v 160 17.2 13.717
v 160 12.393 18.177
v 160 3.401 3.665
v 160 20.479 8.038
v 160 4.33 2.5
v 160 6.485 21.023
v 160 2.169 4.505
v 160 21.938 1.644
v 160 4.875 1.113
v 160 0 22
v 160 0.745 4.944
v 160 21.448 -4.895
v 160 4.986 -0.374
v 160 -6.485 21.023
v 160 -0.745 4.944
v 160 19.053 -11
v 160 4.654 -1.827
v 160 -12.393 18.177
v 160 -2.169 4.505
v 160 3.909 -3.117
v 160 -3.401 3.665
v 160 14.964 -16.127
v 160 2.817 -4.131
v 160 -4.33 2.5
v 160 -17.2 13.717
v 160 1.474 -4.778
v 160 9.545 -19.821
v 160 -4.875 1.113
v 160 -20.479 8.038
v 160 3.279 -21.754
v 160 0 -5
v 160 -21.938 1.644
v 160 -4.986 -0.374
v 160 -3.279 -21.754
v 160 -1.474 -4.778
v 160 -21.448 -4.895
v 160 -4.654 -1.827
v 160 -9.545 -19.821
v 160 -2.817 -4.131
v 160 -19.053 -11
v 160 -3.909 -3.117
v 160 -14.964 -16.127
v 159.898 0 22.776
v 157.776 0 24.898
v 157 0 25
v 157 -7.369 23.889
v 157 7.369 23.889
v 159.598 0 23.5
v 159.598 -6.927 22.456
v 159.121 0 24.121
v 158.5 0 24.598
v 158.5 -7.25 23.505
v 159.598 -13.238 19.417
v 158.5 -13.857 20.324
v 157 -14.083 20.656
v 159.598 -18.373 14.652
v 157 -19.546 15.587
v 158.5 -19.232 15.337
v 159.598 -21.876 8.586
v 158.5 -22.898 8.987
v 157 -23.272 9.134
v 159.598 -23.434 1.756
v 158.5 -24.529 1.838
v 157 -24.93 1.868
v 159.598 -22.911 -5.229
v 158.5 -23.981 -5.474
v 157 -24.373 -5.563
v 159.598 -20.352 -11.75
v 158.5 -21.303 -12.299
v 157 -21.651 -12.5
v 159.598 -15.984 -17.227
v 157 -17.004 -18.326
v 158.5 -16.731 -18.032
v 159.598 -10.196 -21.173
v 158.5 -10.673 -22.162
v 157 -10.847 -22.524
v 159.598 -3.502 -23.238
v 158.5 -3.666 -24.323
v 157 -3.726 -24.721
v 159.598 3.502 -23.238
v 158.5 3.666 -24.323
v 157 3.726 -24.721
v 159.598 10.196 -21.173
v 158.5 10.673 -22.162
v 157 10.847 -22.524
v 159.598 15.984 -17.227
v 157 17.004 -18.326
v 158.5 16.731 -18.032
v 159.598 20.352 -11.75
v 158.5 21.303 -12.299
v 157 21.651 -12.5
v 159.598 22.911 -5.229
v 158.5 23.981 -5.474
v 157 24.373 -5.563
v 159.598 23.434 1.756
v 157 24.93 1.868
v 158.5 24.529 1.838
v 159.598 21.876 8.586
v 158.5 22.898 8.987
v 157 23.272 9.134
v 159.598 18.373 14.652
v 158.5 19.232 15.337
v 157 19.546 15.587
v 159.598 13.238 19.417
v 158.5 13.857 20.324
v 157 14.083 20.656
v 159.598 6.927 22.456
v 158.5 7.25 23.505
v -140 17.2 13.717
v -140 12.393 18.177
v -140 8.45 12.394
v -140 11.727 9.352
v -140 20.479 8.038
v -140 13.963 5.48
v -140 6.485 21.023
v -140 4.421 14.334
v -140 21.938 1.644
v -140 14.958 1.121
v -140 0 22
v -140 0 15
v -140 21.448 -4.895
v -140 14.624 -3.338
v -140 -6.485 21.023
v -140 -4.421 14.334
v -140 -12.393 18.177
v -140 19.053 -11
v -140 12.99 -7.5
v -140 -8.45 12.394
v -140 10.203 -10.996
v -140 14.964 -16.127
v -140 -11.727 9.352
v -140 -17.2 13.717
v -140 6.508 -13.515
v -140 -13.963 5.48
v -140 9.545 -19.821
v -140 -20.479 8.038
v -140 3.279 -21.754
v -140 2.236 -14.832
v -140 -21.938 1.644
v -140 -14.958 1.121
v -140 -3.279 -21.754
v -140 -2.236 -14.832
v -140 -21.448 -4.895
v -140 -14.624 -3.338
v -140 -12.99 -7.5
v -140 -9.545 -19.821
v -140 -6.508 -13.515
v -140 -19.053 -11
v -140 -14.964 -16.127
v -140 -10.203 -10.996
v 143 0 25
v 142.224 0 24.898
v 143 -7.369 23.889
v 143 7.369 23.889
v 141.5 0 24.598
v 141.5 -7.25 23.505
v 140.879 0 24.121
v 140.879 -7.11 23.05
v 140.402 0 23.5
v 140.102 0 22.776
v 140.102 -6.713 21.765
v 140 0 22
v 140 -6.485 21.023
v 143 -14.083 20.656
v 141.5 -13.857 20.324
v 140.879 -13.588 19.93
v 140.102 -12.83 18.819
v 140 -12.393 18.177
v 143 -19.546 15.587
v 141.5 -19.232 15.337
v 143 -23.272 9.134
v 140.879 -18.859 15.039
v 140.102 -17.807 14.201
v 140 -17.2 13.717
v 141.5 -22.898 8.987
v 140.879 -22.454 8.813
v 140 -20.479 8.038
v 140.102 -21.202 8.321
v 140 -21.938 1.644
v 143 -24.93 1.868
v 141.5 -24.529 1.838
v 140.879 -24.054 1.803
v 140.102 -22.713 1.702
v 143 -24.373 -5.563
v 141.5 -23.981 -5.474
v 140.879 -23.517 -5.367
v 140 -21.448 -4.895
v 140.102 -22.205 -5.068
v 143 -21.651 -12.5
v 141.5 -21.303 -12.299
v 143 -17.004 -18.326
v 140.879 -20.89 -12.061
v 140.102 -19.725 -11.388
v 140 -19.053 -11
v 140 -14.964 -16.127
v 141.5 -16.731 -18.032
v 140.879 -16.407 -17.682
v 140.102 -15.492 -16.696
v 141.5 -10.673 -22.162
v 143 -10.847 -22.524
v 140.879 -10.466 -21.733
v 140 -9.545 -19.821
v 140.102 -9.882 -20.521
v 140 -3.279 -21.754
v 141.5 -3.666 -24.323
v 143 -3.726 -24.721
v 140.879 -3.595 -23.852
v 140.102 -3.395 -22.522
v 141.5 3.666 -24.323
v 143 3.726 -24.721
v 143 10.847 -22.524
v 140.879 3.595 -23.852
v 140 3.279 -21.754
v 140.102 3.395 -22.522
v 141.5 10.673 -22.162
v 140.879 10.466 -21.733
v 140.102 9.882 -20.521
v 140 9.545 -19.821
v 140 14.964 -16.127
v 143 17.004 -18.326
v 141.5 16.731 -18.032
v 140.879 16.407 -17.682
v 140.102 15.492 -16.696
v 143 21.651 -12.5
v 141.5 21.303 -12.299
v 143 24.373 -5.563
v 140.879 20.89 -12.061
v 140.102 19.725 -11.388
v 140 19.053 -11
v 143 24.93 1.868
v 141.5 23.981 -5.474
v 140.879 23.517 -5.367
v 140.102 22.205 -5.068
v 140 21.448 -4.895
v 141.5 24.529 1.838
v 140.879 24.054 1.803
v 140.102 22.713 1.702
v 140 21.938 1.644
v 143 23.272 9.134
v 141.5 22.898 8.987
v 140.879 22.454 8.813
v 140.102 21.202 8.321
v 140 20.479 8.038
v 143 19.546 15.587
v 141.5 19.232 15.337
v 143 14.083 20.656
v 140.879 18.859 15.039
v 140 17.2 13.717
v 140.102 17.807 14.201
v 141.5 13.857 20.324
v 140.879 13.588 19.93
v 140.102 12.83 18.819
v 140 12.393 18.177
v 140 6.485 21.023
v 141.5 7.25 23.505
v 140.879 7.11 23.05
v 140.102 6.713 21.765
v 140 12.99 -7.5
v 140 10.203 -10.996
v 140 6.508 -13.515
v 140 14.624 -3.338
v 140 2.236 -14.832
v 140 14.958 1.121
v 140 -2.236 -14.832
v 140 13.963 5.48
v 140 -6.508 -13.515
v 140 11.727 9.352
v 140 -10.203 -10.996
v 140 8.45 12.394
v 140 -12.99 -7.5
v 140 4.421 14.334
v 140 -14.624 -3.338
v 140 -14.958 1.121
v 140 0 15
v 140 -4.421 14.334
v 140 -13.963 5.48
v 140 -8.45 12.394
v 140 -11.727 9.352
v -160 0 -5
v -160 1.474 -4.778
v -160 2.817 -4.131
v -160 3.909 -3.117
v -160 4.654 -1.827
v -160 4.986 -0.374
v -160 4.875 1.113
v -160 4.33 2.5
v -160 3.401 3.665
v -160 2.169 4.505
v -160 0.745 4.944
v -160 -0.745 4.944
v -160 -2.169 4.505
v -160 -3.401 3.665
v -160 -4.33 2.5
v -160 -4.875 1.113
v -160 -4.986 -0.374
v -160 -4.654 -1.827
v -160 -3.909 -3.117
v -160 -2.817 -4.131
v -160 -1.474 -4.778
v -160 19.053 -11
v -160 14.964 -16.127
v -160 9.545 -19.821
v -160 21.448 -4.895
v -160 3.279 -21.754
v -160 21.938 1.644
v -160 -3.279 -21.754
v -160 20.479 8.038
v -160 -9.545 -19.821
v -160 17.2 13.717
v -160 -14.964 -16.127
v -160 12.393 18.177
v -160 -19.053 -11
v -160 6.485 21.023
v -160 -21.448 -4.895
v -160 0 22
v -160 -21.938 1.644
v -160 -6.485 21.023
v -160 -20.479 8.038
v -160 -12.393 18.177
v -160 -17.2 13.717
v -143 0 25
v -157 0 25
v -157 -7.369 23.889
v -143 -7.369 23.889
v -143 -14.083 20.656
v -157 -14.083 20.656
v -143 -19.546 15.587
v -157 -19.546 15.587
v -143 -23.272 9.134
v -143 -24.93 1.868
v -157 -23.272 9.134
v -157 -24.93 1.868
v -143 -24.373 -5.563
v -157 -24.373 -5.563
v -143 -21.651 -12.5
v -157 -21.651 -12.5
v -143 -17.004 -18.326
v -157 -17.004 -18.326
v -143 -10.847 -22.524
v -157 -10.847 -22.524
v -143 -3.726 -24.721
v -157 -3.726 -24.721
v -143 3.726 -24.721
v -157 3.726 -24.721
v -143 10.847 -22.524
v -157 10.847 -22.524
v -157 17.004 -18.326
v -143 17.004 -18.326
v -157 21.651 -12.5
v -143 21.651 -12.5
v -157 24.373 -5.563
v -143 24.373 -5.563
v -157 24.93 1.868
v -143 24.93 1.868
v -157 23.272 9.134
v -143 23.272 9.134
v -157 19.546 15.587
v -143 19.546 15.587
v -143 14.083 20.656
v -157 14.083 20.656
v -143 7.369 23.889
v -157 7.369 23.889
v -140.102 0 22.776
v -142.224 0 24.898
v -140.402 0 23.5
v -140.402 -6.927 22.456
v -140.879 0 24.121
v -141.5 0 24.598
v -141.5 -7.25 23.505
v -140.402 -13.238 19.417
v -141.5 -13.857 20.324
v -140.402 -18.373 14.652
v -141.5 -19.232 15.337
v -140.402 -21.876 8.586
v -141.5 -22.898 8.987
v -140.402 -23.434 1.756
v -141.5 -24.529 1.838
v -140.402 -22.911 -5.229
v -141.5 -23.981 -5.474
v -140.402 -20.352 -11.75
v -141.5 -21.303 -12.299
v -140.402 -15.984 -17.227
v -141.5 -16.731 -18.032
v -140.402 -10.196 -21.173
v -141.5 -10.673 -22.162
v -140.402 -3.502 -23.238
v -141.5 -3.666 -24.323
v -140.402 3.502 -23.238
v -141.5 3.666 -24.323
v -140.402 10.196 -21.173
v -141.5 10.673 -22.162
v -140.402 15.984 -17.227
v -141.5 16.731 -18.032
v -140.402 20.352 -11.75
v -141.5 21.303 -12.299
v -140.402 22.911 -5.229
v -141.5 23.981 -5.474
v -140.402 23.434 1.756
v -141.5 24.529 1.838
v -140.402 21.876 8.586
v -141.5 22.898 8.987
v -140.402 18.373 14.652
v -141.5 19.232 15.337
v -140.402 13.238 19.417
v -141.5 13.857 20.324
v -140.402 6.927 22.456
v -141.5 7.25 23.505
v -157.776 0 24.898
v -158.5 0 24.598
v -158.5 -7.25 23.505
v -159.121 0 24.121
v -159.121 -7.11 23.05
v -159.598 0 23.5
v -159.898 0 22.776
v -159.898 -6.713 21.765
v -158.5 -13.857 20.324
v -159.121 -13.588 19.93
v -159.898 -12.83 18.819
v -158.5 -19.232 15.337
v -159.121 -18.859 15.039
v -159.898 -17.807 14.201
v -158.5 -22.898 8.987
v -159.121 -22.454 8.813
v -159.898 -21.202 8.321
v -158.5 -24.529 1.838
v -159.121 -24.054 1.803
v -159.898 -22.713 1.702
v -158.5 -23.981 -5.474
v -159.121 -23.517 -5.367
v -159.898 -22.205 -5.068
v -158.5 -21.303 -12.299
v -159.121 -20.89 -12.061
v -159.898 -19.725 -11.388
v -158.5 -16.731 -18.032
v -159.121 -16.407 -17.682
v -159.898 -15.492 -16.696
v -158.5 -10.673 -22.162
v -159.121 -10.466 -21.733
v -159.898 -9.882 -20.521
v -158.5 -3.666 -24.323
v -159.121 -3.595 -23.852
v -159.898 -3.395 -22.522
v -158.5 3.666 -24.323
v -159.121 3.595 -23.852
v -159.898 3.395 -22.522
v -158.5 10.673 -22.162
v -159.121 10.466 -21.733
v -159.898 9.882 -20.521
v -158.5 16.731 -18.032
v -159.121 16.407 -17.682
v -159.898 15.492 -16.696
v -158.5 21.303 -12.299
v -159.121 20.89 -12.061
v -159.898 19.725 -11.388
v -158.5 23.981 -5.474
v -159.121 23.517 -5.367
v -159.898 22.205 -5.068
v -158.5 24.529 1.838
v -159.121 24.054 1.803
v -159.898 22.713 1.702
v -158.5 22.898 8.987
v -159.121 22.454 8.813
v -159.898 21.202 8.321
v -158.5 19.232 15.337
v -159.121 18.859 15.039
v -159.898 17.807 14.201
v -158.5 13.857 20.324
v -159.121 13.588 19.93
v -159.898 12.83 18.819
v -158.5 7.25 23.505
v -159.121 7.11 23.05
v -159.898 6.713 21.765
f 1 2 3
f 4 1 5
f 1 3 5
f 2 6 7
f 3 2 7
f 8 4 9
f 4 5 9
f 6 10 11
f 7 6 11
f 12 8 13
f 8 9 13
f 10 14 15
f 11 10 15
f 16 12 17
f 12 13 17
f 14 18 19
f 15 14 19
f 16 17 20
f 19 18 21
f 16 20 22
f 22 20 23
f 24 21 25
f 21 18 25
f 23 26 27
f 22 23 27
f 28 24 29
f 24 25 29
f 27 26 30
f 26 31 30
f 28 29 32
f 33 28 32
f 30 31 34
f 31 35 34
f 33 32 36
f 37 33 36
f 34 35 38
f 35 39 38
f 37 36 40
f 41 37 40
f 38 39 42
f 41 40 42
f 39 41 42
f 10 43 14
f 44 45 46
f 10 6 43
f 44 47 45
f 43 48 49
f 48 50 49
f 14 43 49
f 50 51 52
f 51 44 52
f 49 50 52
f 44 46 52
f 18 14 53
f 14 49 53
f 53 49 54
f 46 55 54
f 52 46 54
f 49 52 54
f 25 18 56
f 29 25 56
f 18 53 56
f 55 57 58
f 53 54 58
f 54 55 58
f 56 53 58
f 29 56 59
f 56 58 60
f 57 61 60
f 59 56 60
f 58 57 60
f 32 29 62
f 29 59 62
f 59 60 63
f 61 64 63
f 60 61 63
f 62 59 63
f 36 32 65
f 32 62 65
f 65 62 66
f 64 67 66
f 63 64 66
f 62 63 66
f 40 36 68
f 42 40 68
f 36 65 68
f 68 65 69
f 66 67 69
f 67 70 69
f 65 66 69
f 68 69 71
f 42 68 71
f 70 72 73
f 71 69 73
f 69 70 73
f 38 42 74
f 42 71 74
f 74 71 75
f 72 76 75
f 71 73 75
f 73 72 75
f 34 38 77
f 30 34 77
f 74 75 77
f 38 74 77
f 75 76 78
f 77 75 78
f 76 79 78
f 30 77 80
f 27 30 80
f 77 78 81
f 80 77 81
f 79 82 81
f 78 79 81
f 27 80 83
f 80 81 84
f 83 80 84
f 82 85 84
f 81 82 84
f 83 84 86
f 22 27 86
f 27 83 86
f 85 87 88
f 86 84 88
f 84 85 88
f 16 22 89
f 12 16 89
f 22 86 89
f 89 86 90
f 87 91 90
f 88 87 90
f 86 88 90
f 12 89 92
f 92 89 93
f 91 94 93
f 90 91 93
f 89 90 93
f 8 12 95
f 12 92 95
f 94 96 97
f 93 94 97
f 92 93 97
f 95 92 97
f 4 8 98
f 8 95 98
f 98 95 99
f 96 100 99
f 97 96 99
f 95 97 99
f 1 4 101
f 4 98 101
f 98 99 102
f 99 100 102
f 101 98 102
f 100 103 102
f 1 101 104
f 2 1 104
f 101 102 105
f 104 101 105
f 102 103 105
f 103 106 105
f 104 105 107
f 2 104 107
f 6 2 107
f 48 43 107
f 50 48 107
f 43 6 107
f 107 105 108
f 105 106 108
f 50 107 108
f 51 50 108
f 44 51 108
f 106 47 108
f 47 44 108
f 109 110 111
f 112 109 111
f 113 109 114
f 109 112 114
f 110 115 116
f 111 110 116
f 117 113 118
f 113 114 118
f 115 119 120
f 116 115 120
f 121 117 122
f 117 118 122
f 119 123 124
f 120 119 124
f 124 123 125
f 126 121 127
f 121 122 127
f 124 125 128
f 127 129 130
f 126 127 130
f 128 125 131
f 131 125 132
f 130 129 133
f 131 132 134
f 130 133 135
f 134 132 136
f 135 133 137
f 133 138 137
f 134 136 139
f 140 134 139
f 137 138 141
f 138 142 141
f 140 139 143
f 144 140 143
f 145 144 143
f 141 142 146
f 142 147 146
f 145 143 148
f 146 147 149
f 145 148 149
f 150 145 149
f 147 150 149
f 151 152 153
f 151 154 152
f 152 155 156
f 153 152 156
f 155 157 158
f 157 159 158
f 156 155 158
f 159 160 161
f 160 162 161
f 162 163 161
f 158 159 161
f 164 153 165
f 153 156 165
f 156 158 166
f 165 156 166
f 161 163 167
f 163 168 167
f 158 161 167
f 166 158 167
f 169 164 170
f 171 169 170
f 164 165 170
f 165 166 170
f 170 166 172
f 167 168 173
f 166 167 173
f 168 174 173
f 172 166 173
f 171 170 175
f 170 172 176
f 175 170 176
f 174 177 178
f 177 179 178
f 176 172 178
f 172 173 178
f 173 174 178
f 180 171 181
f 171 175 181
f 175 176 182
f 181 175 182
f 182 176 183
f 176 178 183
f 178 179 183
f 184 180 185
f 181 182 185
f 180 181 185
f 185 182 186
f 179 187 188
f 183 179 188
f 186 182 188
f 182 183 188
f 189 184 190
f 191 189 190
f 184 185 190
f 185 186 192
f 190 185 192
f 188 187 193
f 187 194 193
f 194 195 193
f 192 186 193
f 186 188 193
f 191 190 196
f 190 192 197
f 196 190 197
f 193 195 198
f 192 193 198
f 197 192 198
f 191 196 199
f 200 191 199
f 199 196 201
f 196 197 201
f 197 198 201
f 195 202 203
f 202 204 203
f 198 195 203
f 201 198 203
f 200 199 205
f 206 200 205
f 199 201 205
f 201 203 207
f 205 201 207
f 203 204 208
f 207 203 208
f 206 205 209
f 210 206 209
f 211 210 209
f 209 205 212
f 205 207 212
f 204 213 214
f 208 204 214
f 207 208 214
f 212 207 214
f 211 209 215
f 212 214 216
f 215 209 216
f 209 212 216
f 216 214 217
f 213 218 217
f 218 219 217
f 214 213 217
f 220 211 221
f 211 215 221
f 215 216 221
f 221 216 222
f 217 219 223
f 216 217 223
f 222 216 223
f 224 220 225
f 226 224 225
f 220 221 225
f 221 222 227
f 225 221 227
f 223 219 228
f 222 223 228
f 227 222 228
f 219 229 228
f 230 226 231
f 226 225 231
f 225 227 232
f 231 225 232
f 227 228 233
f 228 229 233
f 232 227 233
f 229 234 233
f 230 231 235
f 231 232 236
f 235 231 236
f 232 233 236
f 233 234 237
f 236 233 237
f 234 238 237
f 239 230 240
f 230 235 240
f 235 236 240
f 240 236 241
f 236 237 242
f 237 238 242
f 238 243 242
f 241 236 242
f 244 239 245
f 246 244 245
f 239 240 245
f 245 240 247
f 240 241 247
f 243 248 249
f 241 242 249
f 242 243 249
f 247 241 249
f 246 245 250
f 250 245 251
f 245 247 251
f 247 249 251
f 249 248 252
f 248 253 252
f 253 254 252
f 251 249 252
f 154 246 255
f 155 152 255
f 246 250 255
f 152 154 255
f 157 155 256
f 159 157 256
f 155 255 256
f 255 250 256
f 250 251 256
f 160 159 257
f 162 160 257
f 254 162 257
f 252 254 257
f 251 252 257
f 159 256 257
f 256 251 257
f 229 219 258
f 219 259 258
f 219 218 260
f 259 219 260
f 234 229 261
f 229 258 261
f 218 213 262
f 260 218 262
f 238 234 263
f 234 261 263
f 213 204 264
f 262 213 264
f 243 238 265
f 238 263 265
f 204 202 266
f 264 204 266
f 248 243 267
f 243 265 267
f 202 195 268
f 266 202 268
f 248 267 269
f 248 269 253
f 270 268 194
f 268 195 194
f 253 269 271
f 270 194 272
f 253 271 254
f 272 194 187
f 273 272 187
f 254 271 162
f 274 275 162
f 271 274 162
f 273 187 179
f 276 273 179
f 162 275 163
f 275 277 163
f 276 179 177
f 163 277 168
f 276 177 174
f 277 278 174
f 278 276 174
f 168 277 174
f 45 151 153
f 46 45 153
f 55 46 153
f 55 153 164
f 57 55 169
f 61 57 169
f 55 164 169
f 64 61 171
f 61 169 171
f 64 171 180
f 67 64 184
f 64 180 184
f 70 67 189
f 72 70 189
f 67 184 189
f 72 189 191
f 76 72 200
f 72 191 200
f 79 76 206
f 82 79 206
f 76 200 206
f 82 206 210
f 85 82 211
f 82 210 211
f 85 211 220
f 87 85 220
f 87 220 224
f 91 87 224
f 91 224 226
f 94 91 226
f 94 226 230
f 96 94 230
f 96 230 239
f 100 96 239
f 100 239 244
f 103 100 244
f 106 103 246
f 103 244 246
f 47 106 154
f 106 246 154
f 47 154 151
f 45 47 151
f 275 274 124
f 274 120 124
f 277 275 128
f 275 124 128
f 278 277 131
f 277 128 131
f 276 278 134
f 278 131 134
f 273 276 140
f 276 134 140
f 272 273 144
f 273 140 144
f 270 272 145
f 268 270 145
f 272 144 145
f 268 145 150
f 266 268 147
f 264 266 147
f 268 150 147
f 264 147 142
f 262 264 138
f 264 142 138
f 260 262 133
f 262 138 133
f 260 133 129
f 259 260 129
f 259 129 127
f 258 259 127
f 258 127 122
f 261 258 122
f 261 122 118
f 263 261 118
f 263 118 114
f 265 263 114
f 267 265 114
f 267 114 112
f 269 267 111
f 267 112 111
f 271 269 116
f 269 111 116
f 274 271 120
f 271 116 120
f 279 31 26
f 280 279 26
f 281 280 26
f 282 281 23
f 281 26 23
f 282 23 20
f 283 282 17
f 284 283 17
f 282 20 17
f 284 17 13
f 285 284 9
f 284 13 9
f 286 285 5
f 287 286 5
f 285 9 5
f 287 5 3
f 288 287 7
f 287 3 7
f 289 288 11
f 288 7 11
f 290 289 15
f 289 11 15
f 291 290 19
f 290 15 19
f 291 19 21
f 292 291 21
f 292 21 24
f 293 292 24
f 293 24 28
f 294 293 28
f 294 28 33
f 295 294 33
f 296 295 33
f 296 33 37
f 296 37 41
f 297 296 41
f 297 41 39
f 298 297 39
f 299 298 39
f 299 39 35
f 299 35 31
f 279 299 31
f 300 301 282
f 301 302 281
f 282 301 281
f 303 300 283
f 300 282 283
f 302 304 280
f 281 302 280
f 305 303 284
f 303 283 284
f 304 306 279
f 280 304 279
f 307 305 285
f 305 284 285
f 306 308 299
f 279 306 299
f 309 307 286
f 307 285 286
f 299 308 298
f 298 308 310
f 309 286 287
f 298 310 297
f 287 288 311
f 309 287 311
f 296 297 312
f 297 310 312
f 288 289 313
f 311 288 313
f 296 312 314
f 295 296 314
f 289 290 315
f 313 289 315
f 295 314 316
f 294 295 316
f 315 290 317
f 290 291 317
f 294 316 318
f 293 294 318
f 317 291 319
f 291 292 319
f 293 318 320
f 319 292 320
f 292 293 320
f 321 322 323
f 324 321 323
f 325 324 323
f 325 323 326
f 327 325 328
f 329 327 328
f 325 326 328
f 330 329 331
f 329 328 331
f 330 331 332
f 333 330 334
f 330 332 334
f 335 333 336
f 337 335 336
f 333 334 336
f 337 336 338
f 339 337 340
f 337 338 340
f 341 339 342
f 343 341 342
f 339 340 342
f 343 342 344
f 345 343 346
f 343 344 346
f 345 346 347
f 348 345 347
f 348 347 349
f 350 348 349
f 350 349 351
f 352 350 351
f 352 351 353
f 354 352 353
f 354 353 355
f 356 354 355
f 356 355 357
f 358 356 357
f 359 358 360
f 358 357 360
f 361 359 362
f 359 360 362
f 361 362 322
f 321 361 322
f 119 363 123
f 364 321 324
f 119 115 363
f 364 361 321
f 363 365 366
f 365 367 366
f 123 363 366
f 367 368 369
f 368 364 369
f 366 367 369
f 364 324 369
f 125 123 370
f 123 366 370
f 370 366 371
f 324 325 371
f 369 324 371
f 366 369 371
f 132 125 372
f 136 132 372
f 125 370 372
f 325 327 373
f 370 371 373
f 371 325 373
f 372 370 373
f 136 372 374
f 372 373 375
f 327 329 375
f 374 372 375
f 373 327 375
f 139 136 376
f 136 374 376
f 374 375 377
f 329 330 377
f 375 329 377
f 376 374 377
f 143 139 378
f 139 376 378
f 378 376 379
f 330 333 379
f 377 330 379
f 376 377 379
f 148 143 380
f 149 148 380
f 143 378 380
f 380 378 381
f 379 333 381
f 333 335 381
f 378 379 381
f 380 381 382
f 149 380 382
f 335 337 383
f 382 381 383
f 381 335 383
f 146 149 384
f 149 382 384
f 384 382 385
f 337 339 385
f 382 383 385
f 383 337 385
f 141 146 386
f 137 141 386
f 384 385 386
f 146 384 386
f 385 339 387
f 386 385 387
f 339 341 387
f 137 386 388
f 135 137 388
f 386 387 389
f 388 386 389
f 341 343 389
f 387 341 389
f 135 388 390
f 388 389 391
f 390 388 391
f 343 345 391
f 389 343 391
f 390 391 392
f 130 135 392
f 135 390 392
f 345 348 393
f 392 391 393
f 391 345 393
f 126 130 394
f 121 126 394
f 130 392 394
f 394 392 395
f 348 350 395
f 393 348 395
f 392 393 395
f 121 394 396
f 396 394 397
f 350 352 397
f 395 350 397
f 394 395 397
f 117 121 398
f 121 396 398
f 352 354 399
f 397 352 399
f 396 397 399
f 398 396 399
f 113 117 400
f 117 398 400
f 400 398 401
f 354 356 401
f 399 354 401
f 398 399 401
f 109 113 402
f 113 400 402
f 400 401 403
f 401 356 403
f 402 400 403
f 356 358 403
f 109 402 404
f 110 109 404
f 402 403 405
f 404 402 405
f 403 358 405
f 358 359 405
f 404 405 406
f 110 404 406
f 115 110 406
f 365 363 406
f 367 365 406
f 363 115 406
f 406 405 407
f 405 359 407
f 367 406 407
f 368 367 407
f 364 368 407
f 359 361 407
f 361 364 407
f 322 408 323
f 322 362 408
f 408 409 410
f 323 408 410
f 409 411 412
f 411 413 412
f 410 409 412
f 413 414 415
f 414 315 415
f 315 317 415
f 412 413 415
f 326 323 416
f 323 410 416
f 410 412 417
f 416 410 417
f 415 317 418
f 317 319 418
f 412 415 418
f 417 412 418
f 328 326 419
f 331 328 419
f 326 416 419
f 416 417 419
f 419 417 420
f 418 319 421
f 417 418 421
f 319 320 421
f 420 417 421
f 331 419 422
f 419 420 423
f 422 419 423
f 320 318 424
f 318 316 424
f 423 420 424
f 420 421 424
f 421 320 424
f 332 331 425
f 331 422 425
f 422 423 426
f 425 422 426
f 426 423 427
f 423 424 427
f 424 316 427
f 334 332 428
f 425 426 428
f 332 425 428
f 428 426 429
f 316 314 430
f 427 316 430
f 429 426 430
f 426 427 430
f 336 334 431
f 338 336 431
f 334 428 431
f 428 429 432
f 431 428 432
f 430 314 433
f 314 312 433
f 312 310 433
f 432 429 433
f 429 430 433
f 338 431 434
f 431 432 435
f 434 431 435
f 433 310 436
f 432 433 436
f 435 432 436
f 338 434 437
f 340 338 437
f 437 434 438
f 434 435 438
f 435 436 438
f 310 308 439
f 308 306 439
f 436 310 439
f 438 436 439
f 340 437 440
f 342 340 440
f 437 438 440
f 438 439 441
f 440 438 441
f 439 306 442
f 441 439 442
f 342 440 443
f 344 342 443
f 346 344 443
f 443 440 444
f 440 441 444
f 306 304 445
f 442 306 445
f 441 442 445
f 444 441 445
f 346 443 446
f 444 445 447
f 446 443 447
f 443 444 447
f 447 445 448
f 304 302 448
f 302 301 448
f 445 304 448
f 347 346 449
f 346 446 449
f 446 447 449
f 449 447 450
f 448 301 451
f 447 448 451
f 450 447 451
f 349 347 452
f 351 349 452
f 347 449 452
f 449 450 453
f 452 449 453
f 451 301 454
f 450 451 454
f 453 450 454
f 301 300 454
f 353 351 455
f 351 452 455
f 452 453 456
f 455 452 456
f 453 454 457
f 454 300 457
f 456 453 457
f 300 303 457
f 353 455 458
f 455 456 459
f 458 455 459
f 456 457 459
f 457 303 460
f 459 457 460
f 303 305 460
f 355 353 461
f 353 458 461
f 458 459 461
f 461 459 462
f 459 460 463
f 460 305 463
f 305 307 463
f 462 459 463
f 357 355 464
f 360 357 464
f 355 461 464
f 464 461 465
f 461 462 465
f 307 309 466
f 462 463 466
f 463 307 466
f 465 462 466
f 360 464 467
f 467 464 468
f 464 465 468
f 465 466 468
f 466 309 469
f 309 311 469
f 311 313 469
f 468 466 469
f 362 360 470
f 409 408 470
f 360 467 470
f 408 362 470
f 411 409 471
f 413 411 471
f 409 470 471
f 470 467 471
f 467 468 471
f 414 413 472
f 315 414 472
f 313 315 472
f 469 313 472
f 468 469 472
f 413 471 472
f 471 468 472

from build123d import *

# Parameters (mm, degrees)
FILLET1_R          = 3
SKETCH3_R          = 5
CUT_EXTRUDE1_DEPTH = 322.947200755


with BuildPart() as part:
    # Sketch2 → Revolve1 (revolve)
    with BuildSketch(Plane(origin=(0, 0, 0), x_dir=(1, 0, 0), z_dir=(0, 1, 0))):
        Polygon((-160, 0), (160, 0), (160, -25), (140, -25), (140, -15), (-140, -15), (-140, -25), (-160, -25), align=None)
    revolve(axis=Axis((-179.615783414, 0, 0), (1, 0, 0)))

    # Fillet1
    fillet1_edges = [part.edges().sort_by_distance(p)[0] for p in [
        (140, 0, -25),
        (160, 0, -25),
        (-160, 0, -25),
        (-140, 0, -25),
    ]]
    fillet(fillet1_edges, radius=FILLET1_R)

    # Sketch3 → Cut-Extrude1 (cut, through all)
    with BuildSketch(Plane(origin=(160, 0, 0), x_dir=(0, 0, -1), z_dir=(1, 0, 0))):
        Circle(SKETCH3_R)
    extrude(amount=-CUT_EXTRUDE1_DEPTH, mode=Mode.SUBTRACT)


solid = part.part
